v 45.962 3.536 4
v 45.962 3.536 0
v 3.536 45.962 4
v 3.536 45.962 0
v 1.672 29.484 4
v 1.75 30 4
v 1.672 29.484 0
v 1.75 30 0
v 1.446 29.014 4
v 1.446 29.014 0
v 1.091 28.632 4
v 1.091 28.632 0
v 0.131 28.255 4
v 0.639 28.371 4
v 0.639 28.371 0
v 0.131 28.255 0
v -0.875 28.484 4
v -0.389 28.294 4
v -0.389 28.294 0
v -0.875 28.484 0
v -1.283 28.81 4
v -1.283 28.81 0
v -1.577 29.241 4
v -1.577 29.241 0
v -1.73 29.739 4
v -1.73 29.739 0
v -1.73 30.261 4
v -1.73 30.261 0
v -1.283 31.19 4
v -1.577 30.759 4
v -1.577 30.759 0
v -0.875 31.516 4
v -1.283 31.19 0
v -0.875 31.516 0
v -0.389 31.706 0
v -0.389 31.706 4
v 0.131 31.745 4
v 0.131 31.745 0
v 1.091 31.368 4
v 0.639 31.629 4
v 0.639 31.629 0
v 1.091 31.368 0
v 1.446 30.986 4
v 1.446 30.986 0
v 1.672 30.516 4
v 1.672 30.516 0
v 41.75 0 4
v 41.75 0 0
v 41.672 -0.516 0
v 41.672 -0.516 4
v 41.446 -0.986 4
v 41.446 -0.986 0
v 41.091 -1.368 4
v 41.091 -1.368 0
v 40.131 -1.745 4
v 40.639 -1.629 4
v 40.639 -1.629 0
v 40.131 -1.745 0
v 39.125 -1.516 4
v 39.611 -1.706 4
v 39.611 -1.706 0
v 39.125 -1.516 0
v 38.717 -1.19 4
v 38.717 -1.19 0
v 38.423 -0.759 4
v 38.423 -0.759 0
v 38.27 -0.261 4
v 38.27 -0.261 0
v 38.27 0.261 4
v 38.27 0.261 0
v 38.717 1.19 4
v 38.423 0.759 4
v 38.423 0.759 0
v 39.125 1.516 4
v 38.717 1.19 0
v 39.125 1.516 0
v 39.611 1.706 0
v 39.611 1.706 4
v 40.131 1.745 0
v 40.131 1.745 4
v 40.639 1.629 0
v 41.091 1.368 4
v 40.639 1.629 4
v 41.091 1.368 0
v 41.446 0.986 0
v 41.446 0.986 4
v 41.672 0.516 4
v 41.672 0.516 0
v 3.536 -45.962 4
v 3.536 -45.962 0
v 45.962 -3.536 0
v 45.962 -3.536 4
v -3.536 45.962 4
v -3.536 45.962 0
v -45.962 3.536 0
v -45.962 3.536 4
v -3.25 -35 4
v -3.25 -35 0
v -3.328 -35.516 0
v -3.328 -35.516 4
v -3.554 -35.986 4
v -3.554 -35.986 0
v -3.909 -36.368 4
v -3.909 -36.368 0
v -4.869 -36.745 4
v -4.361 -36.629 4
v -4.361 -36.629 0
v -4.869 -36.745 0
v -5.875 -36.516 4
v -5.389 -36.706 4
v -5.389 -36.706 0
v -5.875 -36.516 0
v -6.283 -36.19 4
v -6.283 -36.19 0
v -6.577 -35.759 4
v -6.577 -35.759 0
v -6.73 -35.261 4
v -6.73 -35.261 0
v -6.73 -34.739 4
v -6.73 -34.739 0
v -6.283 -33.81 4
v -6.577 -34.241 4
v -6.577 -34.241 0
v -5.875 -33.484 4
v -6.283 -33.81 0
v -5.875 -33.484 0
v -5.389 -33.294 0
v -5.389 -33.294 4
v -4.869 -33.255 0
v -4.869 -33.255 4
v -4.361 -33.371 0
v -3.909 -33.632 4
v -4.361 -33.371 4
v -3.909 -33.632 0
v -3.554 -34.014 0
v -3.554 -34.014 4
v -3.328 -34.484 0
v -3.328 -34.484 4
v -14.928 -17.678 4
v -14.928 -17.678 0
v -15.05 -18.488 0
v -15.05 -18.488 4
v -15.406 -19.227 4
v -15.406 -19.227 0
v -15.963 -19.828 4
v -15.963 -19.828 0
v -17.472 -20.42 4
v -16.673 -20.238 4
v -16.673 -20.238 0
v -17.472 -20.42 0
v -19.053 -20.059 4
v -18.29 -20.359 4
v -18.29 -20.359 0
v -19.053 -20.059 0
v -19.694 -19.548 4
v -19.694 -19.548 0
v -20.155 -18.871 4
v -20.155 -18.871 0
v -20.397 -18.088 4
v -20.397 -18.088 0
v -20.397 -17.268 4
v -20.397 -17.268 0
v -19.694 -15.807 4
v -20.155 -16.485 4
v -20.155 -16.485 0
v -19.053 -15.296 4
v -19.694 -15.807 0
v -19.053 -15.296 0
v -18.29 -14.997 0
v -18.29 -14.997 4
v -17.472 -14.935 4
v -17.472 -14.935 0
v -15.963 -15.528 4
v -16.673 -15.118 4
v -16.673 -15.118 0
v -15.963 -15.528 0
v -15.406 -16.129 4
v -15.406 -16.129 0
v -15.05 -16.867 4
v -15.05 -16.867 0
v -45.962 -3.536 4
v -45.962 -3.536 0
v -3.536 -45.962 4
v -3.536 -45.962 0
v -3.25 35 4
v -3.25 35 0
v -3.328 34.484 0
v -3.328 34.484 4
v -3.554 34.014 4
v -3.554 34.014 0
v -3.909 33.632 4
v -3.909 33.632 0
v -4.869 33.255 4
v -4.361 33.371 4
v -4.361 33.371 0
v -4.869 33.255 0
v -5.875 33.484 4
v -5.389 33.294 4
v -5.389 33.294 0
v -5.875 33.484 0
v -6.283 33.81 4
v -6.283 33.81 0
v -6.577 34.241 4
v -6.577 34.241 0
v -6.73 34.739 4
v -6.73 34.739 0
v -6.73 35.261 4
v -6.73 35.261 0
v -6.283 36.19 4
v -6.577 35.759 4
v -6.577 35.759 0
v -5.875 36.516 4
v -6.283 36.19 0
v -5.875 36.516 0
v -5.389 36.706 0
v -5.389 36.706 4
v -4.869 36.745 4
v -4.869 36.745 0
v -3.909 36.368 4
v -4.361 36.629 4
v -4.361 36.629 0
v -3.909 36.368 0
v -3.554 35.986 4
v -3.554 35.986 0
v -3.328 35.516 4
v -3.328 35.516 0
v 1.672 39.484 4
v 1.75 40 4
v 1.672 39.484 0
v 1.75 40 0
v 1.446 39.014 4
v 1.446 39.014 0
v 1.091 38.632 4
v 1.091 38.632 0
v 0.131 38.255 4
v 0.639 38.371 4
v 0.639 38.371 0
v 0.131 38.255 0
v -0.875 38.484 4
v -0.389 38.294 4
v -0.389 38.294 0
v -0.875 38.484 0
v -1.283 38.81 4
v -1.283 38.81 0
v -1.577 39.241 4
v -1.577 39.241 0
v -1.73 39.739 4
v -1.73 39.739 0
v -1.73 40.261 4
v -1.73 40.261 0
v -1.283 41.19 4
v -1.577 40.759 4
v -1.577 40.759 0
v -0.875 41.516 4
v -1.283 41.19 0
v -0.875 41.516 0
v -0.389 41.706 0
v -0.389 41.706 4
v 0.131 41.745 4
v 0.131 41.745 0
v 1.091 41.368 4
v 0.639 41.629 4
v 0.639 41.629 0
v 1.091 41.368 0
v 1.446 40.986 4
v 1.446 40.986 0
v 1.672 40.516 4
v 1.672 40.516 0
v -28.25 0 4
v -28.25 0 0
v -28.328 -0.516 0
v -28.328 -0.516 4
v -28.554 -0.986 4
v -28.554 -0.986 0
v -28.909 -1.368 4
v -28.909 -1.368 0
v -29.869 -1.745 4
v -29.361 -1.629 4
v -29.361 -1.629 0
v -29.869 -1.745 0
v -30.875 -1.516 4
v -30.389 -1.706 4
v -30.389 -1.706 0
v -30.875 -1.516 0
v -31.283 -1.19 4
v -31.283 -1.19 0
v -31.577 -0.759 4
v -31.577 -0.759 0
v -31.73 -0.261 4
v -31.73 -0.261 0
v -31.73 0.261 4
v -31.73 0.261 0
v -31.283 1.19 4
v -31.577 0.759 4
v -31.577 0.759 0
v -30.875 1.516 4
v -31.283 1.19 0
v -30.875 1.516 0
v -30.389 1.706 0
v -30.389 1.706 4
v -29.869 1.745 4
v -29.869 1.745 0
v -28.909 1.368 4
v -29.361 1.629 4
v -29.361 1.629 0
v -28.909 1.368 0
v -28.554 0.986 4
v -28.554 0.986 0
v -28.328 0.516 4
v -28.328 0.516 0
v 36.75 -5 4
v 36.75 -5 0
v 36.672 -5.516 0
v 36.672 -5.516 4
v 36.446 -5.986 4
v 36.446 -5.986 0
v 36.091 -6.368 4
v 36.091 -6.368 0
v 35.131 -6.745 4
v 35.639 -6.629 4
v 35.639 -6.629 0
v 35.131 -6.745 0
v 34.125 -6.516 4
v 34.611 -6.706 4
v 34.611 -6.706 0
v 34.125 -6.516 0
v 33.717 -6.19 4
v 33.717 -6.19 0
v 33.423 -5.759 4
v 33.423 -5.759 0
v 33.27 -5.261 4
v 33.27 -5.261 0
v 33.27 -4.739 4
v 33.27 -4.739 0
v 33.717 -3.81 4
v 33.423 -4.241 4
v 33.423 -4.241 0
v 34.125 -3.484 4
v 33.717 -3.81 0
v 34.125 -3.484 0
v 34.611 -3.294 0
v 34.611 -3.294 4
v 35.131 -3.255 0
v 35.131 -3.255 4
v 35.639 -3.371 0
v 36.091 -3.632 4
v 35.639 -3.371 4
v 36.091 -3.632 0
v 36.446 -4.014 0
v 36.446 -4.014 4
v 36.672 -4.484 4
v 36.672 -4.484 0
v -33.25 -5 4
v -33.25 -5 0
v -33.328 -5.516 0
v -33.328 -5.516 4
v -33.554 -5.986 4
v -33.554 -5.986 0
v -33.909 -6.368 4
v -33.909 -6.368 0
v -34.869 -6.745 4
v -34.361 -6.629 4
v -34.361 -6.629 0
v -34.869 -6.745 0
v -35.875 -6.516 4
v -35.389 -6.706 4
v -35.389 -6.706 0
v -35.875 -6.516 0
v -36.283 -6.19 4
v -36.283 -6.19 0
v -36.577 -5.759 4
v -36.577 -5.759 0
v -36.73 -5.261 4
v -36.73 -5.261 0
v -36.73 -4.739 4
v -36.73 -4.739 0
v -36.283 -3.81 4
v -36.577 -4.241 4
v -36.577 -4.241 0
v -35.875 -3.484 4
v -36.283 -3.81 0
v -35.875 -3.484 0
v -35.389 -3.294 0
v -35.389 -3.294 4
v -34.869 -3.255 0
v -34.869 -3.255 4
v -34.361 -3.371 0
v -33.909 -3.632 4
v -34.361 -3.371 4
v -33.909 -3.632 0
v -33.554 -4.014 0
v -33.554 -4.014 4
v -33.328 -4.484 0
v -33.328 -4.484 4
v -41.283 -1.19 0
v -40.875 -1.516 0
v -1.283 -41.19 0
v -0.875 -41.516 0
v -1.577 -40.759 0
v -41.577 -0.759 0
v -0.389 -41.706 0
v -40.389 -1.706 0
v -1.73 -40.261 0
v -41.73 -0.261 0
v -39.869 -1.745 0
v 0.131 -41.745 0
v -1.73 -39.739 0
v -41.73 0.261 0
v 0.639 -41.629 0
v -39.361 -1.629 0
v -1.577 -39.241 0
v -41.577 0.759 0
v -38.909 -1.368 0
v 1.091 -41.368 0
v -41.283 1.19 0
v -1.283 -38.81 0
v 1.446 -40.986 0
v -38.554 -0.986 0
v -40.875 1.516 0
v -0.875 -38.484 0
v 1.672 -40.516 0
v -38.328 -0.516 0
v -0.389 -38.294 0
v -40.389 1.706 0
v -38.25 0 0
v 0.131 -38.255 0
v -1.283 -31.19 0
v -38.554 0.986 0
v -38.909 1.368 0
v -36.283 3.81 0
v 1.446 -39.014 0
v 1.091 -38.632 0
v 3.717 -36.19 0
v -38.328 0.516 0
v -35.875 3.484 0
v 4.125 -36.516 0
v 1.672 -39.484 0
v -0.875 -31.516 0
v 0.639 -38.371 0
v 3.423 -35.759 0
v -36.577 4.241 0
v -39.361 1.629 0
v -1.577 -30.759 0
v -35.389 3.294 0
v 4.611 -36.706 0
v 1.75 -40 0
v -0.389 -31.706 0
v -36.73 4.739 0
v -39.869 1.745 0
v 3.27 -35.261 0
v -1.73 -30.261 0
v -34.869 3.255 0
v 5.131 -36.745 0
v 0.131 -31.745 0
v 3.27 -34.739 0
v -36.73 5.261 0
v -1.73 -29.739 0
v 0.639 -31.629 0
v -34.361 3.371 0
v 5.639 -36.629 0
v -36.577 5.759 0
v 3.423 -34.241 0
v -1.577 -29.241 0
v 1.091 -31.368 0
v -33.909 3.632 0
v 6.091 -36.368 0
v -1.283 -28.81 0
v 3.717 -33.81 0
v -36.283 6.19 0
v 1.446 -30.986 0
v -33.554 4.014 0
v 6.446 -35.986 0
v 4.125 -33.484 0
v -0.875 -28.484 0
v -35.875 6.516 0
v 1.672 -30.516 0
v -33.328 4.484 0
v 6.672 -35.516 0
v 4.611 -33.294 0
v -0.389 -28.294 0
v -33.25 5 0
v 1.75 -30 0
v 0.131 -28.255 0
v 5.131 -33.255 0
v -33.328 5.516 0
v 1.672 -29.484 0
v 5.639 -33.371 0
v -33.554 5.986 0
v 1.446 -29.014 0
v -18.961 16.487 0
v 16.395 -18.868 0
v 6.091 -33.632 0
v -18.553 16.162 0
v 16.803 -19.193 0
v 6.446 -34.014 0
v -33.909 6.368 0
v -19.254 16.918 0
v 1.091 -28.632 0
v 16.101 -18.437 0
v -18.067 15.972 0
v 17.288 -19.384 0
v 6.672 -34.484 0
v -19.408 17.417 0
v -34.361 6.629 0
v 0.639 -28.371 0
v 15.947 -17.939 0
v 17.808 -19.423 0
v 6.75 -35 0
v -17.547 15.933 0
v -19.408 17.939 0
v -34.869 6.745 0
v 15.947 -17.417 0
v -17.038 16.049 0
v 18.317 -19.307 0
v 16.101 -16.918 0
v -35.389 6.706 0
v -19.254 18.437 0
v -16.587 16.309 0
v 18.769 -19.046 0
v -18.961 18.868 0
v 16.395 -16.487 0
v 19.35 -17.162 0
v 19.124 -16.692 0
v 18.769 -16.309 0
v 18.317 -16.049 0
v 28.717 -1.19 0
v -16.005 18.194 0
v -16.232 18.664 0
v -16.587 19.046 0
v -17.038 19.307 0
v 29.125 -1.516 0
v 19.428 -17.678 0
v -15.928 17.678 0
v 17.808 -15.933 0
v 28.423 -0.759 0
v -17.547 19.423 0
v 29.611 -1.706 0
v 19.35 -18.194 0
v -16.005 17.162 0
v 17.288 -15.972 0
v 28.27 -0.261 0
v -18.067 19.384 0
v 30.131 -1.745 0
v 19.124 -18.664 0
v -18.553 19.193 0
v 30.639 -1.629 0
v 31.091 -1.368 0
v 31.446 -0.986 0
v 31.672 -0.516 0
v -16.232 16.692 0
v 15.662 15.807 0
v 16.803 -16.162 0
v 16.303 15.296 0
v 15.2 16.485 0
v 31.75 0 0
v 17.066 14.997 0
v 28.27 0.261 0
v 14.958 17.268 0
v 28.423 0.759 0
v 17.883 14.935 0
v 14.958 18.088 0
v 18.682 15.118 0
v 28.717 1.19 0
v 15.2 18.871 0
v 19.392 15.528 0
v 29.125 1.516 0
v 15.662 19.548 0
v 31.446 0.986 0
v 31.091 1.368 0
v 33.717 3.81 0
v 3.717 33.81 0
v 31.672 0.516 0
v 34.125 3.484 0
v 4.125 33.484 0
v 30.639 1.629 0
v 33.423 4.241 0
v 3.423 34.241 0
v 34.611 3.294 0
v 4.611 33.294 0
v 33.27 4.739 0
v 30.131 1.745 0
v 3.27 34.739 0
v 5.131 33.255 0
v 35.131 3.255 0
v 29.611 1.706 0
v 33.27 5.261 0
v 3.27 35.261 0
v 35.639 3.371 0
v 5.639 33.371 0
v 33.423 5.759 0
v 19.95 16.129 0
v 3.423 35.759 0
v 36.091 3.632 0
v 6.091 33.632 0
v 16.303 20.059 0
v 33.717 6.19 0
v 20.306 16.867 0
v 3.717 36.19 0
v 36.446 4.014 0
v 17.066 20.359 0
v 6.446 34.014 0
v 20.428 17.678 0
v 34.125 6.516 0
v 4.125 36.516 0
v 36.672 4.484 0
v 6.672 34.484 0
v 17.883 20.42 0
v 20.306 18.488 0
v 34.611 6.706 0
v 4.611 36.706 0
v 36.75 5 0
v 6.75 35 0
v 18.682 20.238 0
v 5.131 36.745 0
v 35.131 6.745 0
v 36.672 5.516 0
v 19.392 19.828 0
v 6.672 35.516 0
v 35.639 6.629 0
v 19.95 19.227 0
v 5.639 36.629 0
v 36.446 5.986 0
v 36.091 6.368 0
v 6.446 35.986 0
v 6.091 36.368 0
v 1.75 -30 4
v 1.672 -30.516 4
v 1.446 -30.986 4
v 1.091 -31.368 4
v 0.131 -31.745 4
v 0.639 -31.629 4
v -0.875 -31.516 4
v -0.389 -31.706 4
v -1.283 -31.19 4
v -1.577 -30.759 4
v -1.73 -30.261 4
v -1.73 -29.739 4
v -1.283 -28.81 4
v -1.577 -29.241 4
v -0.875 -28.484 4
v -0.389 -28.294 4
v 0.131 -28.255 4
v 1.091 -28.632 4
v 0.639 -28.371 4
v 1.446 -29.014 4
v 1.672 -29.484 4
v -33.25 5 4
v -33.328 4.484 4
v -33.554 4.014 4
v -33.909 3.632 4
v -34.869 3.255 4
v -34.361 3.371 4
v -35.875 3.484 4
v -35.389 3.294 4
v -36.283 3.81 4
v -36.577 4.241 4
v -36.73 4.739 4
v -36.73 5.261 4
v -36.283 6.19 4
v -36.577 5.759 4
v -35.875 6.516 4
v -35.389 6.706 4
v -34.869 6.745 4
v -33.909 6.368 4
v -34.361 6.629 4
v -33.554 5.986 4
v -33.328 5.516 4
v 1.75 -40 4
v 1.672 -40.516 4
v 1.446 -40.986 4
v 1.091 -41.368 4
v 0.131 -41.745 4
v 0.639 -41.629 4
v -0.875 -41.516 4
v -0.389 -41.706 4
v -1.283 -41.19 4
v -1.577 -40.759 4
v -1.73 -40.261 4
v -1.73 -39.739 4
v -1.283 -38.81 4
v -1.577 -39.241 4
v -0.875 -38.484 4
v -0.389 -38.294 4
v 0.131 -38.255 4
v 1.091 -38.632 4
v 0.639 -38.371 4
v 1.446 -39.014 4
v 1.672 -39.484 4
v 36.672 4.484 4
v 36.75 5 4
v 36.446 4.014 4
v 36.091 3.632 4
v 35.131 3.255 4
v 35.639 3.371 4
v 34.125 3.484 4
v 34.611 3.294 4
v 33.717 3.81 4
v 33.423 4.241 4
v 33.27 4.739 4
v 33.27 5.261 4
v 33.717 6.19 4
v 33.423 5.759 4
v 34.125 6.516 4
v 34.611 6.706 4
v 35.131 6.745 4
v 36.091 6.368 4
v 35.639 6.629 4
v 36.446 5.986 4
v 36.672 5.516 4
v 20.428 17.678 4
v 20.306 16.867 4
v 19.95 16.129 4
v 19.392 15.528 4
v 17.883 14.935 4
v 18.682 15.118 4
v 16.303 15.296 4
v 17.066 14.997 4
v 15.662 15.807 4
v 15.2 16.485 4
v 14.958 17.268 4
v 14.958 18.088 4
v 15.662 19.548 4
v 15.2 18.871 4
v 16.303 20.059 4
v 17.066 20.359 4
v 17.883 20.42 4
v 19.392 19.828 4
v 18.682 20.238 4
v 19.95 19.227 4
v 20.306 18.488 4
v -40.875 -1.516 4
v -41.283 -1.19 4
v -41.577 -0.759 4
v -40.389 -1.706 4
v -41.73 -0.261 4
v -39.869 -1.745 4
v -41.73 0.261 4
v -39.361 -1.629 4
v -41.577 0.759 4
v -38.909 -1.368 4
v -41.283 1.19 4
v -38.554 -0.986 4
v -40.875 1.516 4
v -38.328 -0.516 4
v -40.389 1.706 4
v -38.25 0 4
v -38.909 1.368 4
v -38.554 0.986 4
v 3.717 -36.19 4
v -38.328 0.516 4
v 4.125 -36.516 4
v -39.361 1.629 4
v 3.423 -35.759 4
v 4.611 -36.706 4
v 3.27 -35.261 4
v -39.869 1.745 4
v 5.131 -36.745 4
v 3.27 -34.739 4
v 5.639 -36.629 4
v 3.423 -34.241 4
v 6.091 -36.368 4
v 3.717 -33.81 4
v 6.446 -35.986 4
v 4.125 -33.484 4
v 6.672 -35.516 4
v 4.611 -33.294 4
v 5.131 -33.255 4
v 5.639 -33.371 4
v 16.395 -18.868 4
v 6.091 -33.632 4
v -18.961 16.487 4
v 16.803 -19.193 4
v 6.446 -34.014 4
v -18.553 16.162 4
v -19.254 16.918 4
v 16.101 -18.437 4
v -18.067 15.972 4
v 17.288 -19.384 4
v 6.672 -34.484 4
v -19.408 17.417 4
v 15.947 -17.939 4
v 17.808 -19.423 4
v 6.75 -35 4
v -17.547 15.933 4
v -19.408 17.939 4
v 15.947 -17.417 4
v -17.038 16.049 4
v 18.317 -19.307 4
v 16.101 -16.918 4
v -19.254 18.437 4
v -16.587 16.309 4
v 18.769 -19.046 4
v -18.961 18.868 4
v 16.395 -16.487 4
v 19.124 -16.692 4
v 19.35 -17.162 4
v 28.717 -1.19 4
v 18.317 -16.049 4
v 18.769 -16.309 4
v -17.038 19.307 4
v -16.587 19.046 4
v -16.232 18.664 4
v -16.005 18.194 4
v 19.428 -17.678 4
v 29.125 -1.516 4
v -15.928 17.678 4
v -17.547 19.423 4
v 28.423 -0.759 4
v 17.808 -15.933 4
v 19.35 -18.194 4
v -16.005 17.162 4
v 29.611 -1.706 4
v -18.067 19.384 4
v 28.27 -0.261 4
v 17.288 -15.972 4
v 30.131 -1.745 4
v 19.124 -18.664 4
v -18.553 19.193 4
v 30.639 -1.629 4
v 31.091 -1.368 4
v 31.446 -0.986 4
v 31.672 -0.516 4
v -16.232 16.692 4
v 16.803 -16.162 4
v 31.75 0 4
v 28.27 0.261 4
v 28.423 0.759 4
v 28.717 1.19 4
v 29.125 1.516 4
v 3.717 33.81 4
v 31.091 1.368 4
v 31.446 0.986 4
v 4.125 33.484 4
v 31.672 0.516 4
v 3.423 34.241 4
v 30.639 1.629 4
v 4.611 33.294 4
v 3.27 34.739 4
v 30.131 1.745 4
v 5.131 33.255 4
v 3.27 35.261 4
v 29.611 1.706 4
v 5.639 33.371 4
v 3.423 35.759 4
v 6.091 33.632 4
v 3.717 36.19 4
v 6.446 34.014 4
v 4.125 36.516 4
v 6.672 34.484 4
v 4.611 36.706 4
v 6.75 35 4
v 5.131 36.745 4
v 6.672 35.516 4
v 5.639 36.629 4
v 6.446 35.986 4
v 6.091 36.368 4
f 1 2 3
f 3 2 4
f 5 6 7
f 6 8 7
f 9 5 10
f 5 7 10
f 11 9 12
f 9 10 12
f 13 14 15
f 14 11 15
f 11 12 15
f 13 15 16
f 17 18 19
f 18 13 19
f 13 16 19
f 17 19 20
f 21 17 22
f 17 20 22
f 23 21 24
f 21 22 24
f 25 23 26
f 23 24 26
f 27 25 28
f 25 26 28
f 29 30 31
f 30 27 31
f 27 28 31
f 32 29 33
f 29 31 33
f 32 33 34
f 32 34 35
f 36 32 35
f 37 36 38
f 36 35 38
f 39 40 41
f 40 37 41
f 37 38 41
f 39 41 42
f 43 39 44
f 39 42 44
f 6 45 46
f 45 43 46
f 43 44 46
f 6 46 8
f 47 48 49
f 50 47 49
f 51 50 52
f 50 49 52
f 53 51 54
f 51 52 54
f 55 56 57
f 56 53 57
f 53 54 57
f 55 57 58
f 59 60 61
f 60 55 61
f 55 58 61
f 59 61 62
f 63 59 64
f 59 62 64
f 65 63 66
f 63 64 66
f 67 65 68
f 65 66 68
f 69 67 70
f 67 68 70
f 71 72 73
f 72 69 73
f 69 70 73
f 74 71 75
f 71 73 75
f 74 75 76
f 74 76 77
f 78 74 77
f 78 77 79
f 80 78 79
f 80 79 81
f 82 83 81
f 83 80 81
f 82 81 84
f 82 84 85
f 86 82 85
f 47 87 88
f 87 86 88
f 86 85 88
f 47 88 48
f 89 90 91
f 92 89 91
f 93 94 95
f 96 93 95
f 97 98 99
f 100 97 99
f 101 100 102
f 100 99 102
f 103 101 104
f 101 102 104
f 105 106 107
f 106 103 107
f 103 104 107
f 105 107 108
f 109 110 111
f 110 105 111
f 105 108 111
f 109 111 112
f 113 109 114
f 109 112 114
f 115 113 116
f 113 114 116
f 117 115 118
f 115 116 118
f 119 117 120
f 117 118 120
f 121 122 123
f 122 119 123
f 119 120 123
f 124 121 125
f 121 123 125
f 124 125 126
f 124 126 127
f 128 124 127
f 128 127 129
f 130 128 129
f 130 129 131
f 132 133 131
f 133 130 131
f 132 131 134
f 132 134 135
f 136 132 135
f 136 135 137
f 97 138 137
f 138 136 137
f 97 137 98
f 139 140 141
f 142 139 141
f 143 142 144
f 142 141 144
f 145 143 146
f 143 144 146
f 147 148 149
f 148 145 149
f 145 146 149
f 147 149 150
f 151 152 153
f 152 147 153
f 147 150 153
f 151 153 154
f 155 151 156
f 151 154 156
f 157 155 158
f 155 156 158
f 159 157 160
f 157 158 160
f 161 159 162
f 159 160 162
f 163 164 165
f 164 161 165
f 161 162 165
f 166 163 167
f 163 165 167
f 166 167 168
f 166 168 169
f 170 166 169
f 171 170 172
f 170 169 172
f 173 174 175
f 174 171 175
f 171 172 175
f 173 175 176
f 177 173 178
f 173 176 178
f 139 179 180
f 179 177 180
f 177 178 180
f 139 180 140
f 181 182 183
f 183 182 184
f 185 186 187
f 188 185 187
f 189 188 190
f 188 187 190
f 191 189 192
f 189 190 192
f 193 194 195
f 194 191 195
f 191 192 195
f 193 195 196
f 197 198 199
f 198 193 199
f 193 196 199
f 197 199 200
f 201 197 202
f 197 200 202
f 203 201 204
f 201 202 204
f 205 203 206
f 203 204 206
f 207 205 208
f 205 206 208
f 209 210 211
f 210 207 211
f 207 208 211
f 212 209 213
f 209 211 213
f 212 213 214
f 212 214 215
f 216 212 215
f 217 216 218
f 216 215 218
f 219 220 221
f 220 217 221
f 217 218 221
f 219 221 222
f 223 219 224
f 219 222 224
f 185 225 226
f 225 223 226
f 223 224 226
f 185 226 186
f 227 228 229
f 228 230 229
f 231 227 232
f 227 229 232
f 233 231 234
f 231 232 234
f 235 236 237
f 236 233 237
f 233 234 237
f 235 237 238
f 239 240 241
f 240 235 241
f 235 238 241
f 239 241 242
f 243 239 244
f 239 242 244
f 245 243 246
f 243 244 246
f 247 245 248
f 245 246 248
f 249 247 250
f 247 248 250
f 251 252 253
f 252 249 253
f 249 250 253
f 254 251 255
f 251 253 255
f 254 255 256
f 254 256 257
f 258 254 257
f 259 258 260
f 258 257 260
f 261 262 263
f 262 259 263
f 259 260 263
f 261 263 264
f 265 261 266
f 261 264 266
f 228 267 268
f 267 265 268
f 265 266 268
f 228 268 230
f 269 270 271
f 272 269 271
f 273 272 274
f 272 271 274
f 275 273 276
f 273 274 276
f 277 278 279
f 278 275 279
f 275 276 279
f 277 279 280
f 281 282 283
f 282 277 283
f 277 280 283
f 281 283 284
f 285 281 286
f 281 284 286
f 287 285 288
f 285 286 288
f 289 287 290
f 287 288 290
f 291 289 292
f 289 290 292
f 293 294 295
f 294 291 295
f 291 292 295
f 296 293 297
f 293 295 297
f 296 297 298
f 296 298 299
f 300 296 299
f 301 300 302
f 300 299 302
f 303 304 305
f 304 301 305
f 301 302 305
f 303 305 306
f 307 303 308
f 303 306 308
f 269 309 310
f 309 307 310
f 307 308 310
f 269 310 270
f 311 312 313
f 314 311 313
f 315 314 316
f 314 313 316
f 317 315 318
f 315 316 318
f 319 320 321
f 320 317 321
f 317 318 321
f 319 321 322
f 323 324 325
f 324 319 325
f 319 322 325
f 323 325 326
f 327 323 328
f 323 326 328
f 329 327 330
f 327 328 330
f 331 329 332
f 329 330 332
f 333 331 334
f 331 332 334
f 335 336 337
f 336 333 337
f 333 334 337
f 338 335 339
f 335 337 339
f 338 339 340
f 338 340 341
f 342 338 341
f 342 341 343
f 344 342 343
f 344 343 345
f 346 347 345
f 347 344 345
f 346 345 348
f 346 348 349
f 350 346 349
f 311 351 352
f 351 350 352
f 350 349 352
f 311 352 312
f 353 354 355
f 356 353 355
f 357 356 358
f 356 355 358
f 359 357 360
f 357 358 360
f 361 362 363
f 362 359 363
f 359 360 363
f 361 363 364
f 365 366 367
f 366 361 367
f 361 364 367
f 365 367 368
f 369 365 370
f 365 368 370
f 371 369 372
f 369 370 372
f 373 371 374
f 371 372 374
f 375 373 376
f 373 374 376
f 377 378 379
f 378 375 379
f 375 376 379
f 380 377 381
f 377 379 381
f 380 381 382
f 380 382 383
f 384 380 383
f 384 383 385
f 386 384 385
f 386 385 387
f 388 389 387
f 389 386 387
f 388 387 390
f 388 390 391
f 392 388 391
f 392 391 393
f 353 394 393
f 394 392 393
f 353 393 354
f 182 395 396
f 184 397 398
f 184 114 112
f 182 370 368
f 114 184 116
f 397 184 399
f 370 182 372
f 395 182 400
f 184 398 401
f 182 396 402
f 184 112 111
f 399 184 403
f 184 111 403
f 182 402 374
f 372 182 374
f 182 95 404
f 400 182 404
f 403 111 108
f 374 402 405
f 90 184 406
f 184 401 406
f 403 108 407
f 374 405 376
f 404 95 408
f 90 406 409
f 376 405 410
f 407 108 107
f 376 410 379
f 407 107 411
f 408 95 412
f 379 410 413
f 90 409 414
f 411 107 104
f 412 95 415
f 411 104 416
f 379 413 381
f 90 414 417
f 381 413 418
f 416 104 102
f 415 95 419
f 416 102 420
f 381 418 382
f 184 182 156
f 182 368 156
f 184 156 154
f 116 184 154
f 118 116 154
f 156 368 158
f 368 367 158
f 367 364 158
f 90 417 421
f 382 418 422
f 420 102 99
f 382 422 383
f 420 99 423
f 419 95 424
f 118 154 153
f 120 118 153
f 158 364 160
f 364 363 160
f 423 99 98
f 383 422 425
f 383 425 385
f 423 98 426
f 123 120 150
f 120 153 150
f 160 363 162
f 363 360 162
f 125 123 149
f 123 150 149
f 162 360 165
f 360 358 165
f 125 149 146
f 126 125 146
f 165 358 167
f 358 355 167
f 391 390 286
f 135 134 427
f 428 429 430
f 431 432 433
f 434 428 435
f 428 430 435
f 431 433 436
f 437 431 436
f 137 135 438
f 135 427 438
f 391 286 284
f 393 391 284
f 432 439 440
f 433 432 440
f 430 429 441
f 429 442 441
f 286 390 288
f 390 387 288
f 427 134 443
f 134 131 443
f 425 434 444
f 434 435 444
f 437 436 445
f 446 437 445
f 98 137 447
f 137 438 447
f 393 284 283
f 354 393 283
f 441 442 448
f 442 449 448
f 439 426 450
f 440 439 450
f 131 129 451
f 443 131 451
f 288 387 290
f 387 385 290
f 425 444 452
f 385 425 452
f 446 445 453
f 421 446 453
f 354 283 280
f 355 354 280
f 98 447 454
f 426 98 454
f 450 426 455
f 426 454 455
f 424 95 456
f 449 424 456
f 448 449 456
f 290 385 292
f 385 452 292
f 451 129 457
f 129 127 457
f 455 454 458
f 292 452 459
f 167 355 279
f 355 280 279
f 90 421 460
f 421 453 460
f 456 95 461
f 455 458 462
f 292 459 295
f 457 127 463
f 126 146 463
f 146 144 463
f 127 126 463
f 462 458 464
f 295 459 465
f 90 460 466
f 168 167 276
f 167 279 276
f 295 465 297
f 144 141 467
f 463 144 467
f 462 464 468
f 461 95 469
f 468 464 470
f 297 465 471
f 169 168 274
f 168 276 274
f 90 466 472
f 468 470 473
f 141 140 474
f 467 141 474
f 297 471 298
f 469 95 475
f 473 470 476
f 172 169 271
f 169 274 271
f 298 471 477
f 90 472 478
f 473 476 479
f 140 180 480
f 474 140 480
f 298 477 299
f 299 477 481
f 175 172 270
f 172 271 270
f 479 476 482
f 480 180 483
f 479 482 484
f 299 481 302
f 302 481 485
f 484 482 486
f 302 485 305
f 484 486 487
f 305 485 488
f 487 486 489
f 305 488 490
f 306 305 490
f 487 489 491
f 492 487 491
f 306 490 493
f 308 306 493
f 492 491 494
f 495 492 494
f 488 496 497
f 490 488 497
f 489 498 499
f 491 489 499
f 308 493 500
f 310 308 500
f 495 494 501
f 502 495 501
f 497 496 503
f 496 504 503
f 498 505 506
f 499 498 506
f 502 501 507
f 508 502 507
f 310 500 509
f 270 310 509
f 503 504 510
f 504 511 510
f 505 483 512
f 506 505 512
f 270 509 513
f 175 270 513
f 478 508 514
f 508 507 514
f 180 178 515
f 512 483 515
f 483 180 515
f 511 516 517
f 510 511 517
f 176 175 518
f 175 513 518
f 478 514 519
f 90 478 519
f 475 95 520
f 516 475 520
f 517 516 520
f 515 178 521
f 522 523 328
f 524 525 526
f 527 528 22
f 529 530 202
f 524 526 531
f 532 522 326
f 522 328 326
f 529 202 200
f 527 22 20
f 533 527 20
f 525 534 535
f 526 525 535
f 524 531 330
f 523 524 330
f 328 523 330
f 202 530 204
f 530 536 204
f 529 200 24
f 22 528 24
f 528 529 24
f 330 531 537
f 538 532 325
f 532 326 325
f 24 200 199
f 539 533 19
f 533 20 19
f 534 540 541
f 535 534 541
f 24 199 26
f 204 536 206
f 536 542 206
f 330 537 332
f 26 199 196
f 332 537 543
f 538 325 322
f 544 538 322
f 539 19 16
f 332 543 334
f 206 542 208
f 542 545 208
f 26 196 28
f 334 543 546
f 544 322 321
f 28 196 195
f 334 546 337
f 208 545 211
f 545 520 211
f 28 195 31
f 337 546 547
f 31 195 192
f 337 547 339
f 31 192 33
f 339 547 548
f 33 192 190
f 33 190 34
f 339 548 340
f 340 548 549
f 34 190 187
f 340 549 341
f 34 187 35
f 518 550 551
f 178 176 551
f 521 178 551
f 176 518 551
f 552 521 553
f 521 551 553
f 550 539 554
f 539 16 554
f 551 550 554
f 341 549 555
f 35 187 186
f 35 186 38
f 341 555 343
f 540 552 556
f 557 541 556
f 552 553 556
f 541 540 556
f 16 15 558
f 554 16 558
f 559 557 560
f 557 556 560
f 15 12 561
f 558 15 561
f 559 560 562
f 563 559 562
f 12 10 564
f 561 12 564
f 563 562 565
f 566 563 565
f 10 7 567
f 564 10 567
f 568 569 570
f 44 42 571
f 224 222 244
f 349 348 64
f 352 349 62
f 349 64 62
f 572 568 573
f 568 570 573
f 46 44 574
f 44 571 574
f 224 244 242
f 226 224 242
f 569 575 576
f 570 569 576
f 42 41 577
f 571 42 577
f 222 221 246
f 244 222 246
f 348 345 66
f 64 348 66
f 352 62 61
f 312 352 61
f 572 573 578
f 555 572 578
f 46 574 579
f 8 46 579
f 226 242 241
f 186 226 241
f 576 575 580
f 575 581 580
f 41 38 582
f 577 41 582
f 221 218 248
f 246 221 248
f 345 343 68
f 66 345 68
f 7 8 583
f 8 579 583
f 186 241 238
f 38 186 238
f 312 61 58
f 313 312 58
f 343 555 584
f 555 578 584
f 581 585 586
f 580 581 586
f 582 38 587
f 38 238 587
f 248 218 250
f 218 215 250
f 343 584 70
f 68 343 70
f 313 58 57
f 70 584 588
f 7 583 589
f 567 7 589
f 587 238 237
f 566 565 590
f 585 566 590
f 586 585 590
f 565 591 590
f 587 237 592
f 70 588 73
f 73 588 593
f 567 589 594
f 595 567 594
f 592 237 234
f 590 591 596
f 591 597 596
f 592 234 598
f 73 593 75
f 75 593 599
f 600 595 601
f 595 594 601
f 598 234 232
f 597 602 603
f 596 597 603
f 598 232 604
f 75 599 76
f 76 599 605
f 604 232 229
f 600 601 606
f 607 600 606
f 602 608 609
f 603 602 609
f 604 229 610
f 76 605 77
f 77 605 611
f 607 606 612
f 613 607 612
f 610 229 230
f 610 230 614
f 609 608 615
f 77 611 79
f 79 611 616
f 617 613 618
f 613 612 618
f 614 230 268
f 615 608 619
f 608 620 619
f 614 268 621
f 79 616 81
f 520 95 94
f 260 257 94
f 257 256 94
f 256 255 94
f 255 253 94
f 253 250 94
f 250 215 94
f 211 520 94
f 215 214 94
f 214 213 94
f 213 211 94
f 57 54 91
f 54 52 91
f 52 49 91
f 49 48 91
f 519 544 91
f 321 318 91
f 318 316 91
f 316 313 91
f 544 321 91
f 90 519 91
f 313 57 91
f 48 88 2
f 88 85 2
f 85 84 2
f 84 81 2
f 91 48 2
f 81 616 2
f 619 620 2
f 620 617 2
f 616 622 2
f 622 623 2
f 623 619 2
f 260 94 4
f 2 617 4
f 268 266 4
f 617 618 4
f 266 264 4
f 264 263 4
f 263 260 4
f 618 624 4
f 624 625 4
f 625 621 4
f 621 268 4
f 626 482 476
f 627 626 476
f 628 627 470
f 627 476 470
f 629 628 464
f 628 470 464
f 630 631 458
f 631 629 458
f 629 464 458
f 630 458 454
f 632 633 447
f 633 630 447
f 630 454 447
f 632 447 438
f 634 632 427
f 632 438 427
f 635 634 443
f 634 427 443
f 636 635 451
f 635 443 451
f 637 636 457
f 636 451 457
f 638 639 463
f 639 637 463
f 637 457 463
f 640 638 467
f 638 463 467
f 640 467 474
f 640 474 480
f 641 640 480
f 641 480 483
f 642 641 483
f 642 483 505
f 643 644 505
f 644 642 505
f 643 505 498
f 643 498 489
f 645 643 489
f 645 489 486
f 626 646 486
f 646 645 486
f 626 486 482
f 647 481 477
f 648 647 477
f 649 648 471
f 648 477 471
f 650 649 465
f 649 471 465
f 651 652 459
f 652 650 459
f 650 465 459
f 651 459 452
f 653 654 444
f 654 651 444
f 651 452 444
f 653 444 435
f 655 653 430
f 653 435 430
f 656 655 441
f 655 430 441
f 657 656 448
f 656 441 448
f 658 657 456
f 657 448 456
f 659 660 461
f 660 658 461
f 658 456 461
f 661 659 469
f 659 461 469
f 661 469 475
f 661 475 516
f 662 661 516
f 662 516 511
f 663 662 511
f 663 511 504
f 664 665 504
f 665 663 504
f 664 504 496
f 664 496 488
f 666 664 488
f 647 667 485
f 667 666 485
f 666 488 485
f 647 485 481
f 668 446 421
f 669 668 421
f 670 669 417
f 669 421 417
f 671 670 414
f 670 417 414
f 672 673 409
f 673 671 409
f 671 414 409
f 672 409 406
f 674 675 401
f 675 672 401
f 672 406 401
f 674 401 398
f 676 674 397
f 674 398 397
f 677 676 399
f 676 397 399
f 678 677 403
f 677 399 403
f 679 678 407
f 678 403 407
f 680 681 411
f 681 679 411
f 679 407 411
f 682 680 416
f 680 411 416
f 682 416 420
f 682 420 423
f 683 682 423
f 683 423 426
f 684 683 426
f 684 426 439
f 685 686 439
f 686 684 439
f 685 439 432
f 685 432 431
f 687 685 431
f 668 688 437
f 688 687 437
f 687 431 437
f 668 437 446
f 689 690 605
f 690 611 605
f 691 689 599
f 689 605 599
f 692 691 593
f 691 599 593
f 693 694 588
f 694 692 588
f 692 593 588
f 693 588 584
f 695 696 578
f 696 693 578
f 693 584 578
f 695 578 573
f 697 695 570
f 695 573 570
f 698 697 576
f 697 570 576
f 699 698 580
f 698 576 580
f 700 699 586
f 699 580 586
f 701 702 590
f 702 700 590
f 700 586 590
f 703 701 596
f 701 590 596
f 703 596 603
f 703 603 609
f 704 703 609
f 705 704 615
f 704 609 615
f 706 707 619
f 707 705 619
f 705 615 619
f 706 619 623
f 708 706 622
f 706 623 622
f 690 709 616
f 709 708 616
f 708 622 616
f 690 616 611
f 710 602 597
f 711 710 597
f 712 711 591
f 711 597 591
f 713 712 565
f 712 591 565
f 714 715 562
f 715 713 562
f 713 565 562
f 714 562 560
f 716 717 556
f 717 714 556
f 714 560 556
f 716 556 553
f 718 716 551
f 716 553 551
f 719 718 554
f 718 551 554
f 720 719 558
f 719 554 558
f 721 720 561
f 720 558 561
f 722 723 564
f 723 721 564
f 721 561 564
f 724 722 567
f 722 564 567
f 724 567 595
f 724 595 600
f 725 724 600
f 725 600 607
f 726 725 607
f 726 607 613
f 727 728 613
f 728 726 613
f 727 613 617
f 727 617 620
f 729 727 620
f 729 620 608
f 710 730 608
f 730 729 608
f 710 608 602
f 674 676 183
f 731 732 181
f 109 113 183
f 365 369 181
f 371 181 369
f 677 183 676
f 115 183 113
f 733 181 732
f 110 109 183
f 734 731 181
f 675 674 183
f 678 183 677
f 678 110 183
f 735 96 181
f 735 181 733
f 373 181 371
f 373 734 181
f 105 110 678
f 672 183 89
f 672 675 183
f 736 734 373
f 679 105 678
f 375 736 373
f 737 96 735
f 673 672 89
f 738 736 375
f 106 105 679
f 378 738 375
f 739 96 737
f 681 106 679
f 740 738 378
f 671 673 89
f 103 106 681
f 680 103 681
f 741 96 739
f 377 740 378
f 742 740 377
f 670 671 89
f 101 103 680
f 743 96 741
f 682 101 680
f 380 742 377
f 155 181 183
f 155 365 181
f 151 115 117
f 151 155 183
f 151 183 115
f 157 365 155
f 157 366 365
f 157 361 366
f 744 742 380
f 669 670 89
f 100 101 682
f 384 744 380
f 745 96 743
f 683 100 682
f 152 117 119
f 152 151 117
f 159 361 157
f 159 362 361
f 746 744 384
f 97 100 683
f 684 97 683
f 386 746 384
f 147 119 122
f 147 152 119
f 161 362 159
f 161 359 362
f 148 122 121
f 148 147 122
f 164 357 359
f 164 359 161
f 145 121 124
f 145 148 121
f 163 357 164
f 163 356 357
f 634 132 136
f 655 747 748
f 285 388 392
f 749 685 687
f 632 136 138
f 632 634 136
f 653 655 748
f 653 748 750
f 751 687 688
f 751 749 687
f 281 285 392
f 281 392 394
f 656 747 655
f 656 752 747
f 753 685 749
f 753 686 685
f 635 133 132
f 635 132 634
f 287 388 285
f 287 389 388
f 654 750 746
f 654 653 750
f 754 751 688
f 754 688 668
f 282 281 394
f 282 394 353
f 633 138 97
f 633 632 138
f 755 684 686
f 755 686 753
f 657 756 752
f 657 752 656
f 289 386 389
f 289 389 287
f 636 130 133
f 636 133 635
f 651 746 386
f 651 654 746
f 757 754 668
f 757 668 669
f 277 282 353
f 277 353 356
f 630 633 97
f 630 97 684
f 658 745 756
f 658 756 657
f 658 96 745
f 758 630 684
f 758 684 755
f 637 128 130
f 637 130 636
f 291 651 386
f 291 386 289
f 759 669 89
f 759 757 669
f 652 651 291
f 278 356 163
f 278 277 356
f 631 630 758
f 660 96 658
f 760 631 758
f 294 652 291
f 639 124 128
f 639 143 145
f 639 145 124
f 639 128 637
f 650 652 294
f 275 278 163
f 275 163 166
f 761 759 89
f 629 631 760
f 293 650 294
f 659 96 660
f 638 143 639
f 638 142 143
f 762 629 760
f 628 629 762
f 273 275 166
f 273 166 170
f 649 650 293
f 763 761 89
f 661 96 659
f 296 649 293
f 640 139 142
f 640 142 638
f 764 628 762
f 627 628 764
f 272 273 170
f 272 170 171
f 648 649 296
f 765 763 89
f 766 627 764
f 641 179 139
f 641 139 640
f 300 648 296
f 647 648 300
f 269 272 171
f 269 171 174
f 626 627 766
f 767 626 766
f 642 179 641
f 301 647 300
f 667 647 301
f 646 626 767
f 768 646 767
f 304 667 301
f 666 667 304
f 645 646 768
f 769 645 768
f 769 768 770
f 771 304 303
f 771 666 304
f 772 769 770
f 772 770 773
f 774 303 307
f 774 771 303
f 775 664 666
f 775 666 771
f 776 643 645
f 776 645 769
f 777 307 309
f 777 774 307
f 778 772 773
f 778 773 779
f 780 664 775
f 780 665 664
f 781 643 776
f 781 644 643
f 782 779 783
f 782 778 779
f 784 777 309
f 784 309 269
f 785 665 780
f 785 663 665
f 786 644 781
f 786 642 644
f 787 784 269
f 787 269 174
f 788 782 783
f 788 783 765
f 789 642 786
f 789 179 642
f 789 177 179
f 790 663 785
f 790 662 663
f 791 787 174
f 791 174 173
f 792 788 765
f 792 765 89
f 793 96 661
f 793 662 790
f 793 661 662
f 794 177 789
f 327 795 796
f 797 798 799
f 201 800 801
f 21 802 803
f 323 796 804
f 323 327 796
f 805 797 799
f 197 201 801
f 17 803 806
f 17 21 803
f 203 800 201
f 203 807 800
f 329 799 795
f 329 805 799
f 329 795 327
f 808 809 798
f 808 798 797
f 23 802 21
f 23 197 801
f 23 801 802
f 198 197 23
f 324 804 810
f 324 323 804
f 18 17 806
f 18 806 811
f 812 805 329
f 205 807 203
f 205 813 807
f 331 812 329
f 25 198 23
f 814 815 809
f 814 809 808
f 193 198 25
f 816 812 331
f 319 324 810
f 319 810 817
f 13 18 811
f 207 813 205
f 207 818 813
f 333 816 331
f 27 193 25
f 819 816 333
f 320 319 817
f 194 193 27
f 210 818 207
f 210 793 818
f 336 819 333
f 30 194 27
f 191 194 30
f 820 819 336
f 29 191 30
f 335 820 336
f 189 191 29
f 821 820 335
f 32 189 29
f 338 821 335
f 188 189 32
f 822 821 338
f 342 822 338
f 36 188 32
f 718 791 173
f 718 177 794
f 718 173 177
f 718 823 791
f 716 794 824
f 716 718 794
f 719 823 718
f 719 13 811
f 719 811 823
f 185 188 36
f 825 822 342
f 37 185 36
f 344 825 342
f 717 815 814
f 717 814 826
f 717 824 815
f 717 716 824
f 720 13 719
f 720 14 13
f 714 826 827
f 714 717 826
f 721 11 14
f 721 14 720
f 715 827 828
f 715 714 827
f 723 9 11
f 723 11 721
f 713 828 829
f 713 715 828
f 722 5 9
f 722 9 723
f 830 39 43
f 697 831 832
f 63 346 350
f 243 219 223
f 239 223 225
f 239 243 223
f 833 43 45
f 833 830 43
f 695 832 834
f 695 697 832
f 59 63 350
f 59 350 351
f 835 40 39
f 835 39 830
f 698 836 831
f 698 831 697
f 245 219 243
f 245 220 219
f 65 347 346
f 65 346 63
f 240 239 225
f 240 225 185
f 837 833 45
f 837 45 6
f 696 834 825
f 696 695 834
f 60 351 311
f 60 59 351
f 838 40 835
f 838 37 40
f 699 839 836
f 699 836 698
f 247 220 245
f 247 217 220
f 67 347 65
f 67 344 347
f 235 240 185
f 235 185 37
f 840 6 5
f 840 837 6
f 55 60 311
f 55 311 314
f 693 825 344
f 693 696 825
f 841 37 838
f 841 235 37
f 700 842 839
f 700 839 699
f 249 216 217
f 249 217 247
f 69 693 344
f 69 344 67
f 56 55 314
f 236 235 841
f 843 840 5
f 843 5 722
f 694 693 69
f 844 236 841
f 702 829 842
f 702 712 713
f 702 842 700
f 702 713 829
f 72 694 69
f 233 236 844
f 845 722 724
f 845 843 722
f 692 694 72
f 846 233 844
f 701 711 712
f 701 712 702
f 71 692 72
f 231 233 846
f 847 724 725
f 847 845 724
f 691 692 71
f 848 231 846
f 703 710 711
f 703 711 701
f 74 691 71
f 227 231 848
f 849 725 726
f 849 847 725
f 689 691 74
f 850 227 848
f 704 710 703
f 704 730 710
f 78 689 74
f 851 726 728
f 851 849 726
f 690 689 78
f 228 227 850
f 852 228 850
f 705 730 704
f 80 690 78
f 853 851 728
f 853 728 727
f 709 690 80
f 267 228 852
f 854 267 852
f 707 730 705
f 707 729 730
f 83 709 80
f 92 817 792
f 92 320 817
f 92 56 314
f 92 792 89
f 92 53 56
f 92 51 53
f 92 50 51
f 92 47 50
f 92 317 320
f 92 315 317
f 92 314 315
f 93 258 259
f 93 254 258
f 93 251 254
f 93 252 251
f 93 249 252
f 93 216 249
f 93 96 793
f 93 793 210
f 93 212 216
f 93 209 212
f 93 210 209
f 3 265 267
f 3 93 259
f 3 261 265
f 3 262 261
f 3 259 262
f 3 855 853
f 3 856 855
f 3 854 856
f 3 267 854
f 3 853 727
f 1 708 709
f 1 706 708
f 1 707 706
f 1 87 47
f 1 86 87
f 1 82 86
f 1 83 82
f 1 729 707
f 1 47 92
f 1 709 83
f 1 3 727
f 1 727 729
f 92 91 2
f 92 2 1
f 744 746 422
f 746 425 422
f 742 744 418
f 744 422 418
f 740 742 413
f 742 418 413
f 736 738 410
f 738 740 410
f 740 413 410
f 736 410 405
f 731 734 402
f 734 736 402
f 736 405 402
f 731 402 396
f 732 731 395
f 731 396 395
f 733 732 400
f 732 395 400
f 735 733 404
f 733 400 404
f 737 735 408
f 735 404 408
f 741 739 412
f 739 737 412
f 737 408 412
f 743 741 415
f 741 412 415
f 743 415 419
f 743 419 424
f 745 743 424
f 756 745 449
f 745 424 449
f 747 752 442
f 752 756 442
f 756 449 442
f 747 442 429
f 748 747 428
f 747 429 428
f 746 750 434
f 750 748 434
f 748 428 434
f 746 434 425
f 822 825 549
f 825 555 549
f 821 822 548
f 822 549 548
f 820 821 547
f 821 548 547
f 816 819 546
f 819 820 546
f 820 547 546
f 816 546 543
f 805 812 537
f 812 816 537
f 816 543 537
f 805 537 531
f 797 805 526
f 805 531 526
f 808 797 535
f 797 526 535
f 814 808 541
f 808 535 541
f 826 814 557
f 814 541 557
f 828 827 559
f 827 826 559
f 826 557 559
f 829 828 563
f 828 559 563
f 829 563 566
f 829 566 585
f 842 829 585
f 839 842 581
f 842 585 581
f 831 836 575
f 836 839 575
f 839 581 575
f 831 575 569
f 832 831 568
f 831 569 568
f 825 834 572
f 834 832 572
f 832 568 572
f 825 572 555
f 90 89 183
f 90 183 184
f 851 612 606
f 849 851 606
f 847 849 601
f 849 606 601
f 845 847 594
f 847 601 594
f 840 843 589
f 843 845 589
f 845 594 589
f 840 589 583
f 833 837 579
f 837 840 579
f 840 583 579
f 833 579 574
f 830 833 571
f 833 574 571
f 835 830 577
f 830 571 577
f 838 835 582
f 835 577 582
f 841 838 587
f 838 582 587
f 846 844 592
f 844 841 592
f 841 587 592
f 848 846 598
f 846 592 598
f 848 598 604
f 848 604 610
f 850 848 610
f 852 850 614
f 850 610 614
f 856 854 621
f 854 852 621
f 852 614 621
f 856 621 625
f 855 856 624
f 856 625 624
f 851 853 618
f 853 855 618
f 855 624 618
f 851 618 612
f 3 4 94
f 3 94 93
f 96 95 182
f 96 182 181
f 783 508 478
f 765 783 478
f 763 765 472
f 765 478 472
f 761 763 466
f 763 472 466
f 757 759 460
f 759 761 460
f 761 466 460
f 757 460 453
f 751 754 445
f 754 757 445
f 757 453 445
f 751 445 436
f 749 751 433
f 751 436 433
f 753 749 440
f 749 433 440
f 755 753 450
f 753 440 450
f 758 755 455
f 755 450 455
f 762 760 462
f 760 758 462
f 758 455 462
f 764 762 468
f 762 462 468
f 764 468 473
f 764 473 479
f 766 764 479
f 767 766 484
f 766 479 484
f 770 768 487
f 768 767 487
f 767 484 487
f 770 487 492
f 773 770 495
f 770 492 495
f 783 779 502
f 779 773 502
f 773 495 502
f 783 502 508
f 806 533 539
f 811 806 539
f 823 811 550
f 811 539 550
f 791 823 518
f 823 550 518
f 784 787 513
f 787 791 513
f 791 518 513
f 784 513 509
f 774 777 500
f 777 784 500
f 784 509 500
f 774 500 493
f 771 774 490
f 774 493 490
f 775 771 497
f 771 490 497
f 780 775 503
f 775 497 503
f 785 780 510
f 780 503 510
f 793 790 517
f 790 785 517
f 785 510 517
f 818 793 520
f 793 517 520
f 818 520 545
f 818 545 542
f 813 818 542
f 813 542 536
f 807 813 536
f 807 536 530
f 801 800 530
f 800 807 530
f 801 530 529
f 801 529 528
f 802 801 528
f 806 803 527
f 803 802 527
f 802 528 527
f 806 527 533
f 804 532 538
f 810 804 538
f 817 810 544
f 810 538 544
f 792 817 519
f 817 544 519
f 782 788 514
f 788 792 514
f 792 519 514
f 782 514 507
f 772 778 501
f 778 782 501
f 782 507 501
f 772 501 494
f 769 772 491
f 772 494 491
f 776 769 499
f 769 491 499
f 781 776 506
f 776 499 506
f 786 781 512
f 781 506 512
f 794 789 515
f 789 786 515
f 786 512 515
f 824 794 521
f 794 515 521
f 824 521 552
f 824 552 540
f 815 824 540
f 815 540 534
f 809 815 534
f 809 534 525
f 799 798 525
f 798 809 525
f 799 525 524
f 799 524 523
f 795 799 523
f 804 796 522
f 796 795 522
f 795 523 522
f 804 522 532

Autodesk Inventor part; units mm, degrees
ref_plane "YZ Plane" through (0, 0, 0) normal (1, 0, 0) x (0, 1, 0)
ref_plane "XZ Plane" through (0, 0, 0) normal (0, 1, 0) x (-1, 0, 0)
ref_plane "XY Plane" through (0, 0, 0) normal (0, 0, 1) x (1, 0, 0)
sketch "スケッチ2" plane through (0, 0, 0) normal (0, 0, 1) x (1, 0, 0)
  line L0 (0, -49.4975) -> (49.4975, 0)
  line L1 (49.4975, 0) -> (0, 49.4975)
  line L2 (0, 49.4975) -> (-49.4975, 0)
  line L3 (-49.4975, 0) -> (0, -49.4975)
  line L4 (0, -49.4975) -> (0, 49.4975) construction
  line L5 (49.4975, 0) -> (-49.4975, 0) construction
  circle A0 centre (-5, 35) radius 1.75
  circle A1 centre (5, 35) radius 1.75
  circle A2 centre (-35, -5) radius 1.75
  circle A3 centre (-35, 5) radius 1.75
  circle A4 centre (5, -35) radius 1.75
  circle A5 centre (-5, -35) radius 1.75
  circle A6 centre (35, 5) radius 1.75
  circle A7 centre (35, -5) radius 1.75
  line L6 (-24.7487, 24.7487) -> (24.7487, -24.7487) construction
  line L7 (24.7487, 24.7487) -> (-24.7487, -24.7487) construction
  circle A8 centre (17.6777, 17.6777) radius 2.75
  circle A9 centre (-17.6777, 17.6777) radius 1.75
  circle A10 centre (-17.6777, -17.6777) radius 2.75
  circle A11 centre (17.6777, -17.6777) radius 1.75
  circle A12 centre (-30, 0) radius 1.75
  circle A13 centre (-40, 0) radius 1.75
  line L8 (-35, -5) -> (-35, 5) construction
  circle A14 centre (0, -30) radius 1.75
  circle A15 centre (0, -40) radius 1.75
  circle A16 centre (30, 0) radius 1.75
  circle A17 centre (40, 0) radius 1.75
  circle A18 centre (0, 30) radius 1.75
  circle A19 centre (0, 40) radius 1.75
  point P0 (0, 0)
  dimension "d1" = 3.5
  dimension "d2" = 5
  dimension "d3" = 35
  dimension "d6" = 360
  dimension "d12" = 5.5
  dimension "d13" = 3.5
  dimension "d14" = 25
  dimension "d15" = 25
  dimension "d29" = 70
  dimension "d30" = 5
  dimension "d31" = 5
  dimension "d34" = 360
extrude "押し出し1" add sketch "スケッチ2" along normal blind 4
chamfer "面取り1" distance 5 angle 45 4 edges at (0, -49.4975, 2) (49.4975, 0, 2) (0, 49.4975, 2) (-49.4975, 0, 2)
properties part number "_3D プリント"
